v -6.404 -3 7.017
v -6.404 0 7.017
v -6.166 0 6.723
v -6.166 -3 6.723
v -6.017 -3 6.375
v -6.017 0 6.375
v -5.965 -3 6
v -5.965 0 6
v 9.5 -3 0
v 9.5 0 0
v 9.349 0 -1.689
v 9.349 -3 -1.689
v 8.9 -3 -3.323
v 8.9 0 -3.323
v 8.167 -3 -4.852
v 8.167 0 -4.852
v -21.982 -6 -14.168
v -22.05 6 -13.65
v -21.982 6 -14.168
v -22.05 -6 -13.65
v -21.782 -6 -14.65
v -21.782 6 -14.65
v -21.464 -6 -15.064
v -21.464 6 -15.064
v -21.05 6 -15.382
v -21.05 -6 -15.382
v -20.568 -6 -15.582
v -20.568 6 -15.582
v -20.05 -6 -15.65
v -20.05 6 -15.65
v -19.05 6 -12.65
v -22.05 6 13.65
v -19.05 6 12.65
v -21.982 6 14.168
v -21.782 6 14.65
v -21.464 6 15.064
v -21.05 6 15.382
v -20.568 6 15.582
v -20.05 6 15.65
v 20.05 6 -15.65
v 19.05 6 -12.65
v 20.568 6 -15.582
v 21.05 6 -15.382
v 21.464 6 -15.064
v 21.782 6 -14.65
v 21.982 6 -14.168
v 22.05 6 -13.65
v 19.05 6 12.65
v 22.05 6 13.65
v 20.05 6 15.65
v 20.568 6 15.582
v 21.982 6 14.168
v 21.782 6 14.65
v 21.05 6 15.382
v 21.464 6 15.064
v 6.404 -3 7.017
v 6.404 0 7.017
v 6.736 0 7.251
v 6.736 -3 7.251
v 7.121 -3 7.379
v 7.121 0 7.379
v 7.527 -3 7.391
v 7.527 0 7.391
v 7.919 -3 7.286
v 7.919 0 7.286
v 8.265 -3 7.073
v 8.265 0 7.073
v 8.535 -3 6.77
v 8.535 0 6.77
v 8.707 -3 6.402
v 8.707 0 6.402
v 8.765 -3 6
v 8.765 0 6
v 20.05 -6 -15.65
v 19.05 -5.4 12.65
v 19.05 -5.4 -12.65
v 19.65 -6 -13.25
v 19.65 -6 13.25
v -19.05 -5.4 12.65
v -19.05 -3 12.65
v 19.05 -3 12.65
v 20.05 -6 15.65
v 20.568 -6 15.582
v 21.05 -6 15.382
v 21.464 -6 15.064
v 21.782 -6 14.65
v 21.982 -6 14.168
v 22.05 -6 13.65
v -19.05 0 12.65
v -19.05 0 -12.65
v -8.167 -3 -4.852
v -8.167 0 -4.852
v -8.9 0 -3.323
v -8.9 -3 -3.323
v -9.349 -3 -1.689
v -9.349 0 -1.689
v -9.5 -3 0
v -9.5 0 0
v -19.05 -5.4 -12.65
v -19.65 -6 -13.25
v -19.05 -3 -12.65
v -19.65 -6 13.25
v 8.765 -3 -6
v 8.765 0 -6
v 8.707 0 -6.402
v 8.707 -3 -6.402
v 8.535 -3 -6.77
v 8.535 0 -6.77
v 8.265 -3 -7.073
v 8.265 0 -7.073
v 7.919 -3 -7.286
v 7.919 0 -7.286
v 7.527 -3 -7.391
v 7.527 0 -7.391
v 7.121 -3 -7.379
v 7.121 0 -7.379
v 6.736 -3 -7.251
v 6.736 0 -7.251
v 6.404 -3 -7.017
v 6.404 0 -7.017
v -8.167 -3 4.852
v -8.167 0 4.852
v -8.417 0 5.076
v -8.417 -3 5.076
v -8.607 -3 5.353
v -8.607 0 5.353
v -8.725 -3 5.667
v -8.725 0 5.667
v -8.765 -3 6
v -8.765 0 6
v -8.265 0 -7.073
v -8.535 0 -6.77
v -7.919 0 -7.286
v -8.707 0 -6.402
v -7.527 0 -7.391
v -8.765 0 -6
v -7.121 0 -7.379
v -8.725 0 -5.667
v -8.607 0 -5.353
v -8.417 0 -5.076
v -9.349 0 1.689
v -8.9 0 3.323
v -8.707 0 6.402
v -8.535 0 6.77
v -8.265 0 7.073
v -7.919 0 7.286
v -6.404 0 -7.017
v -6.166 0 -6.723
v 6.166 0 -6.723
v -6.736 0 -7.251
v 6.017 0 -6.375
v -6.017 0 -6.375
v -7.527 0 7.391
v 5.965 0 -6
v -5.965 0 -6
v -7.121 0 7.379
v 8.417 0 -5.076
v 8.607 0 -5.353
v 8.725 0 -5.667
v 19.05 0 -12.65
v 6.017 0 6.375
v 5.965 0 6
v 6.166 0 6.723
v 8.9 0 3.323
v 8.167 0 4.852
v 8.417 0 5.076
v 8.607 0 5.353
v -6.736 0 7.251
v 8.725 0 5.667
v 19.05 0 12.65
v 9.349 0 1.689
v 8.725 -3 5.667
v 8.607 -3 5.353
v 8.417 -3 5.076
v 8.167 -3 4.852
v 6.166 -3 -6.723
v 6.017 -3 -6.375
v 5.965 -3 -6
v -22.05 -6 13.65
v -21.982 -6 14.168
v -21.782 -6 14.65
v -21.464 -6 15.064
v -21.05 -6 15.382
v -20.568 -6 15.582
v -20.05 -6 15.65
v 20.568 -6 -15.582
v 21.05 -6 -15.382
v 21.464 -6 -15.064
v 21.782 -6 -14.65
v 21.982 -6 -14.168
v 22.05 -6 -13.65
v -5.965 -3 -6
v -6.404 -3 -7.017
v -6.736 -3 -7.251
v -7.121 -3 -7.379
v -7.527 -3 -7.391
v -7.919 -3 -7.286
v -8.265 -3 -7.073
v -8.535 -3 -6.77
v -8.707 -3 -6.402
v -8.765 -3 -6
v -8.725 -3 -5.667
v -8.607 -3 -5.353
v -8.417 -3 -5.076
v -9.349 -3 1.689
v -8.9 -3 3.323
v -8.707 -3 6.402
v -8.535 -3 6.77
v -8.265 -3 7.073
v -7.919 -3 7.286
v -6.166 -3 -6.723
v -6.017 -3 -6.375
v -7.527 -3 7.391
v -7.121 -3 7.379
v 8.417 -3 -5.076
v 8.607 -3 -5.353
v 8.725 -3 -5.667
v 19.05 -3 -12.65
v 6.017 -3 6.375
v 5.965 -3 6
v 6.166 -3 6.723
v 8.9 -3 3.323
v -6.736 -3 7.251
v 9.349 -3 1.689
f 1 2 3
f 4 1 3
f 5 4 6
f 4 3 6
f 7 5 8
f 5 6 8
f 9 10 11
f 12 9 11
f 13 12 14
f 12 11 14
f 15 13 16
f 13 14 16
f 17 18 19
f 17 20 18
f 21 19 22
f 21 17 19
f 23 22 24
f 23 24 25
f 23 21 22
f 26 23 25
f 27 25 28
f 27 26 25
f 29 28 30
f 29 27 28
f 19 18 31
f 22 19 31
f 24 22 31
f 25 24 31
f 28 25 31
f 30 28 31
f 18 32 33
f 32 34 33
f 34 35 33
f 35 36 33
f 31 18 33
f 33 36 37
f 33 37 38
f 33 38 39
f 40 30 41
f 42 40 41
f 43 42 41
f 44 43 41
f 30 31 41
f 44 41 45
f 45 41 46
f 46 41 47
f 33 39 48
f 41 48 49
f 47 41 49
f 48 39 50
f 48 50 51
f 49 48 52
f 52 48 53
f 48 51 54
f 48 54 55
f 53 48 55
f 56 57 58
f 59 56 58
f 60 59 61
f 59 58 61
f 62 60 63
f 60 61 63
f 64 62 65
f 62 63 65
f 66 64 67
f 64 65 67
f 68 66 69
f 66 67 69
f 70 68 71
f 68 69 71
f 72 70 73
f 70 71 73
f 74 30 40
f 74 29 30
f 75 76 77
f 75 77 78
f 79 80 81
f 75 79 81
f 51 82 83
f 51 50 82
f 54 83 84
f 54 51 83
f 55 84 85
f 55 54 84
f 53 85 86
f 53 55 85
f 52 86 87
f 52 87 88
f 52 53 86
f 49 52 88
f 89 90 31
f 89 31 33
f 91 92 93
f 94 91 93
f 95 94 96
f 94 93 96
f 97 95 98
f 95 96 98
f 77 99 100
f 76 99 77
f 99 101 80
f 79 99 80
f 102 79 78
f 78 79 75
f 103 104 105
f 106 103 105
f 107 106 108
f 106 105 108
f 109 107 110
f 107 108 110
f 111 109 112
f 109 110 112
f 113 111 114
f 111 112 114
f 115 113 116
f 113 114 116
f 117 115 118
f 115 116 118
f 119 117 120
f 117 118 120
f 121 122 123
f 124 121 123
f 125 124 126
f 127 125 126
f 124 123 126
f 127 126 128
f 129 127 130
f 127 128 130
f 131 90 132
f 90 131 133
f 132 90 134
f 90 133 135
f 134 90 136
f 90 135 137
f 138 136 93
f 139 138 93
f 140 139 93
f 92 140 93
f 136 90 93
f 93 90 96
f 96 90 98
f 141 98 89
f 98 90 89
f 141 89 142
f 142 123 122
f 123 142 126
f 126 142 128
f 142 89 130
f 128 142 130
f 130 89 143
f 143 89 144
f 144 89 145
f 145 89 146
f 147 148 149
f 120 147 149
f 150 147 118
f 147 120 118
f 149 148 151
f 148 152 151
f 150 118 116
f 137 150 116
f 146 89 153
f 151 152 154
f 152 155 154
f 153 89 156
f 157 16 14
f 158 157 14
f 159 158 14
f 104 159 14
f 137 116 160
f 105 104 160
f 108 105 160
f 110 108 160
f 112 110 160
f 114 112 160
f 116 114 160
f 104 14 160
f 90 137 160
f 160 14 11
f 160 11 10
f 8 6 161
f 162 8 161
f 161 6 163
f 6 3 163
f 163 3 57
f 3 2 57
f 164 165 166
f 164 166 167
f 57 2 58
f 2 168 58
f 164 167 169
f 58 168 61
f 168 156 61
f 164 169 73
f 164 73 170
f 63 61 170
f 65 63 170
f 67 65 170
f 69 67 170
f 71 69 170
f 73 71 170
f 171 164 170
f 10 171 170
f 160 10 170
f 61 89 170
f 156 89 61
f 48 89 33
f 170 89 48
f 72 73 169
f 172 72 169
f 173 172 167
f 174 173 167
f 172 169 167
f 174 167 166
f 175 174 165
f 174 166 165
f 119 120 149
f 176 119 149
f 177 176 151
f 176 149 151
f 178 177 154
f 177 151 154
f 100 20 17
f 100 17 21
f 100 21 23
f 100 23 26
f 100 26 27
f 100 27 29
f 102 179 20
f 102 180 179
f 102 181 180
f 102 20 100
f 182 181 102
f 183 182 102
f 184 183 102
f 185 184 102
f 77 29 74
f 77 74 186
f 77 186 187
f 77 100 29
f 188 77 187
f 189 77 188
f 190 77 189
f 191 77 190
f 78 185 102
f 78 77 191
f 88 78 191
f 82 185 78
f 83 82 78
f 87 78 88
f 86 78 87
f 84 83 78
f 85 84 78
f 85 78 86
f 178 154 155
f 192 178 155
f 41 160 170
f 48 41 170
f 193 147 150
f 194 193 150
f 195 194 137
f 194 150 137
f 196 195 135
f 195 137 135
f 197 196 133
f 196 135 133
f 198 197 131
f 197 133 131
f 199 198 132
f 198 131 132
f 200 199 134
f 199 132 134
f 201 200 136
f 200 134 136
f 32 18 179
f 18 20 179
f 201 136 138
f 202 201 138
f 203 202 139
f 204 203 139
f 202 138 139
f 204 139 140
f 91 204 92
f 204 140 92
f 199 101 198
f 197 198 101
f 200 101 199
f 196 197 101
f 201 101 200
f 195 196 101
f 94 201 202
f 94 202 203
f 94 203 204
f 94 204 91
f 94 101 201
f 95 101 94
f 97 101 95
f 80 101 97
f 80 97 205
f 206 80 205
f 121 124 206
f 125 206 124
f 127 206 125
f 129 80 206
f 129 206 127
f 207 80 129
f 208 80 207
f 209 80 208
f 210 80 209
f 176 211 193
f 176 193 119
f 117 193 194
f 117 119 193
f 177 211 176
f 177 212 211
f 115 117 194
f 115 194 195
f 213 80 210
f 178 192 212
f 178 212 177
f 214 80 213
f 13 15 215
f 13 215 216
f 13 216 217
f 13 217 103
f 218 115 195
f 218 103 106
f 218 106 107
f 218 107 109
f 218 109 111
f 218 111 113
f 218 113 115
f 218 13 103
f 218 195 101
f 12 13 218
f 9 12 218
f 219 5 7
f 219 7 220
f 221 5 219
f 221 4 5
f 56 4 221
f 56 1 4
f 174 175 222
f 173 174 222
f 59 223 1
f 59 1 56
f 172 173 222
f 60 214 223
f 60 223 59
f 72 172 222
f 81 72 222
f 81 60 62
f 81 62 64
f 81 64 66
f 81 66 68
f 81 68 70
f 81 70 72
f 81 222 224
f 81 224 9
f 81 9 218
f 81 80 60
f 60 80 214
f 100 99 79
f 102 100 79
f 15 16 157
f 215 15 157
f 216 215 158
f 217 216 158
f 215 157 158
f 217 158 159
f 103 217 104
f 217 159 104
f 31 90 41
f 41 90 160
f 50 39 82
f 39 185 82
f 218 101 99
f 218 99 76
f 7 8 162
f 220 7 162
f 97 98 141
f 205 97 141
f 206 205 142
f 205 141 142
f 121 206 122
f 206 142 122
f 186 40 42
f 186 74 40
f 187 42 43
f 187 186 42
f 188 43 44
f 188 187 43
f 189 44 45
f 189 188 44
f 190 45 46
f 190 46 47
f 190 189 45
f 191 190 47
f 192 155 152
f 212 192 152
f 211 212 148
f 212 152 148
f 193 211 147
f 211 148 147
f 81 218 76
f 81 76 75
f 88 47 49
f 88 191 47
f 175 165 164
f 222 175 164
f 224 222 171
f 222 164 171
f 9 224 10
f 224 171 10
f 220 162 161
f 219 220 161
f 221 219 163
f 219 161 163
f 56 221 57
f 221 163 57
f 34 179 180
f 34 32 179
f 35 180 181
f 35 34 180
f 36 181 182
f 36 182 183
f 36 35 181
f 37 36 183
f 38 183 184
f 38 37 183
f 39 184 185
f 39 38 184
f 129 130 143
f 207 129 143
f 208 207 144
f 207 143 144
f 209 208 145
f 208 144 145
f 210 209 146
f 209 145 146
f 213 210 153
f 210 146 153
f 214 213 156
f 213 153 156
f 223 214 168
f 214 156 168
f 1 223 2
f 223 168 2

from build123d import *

# Parameters (mm, degrees)
F0_W     = 38.1
F0_H     = 25.3
F1_DEPTH = 3
F0_W_2   = 44.1
F0_H_2   = 31.3
F2_DEPTH = 6
F3_DEPTH = 6
F4_SIZE  = 0.6
F5_R     = 2


# Not quite as in the source:
# - a feature names something its author has since deleted; it is built from what else it names


with BuildPart() as f1:
    # F0 (on Front) → F1 (new body)
    with BuildSketch(Plane.XZ):
        Rectangle(F0_W, F0_H)
        with BuildLine():
            ThreePointArc((-8.6746757864, 9), (0, 12.5), (8.6746757864, 9))
            Line((8.6746757864, 9), (12.5, 9))
            Line((12.5, 9), (12.5, 0))
            Line((12.5, 0), (12.5, -9))
            Line((12.5, -9), (8.6746757864, -9))
            ThreePointArc((8.6746757864, -9), (0, -12.5), (-8.6746757864, -9))
            Line((-8.6746757864, -9), (-12.5, -9))
            Line((-12.5, -9), (-12.5, 0))
            Line((-12.5, 0), (-12.5, 9))
            Line((-12.5, 9), (-8.6746757864, 9))
        make_face(mode=Mode.SUBTRACT)
        with BuildLine():
            ThreePointArc((-3.0413812651, 9), (0, 9.5), (3.0413812651, 9))
            Line((3.0413812651, 9), (8.6746757864, 9))
            ThreePointArc((8.6746757864, 9), (0, 12.5), (-8.6746757864, 9))
            Line((-8.6746757864, 9), (-3.0413812651, 9))
        make_face()
        with BuildLine():
            ThreePointArc((12.5, 0), (11.5039872942, -4.8896090165), (8.6746757864, -9))
            Line((8.6746757864, -9), (12.5, -9))
            Line((12.5, -9), (12.5, 0))
        make_face()
        with BuildLine():
            Line((8.6746757864, -9), (3.0413812651, -9))
            ThreePointArc((3.0413812651, -9), (0, -9.5), (-3.0413812651, -9))
            Line((-3.0413812651, -9), (-8.6746757864, -9))
            ThreePointArc((-8.6746757864, -9), (0, -12.5), (8.6746757864, -9))
        make_face()
        with BuildLine():
            Line((-12.5, -9), (-8.6746757864, -9))
            ThreePointArc((-8.6746757864, -9), (-11.5039872942, -4.8896090165), (-12.5, 0))
            Line((-12.5, 0), (-12.5, -9))
        make_face()
        with BuildLine():
            Line((-3.0413812651, 9), (3.0413812651, 9))
            ThreePointArc((3.0413812651, 9), (0, 9.5), (-3.0413812651, 9))
        make_face()
        with BuildLine():
            ThreePointArc((-3.0413812651, -9), (0, -9.5), (3.0413812651, -9))
            Line((3.0413812651, -9), (-3.0413812651, -9))
        make_face()
        with BuildLine():
            ThreePointArc((-6.4036735124, 7.0173332219), (-4.8254540539, 8.1832141102), (-3.0413812651, 9))
            Line((-3.0413812651, 9), (-8.6746757864, 9))
            ThreePointArc((-8.6746757864, 9), (-11.5039872942, 4.8896090165), (-12.5, 0))
            ThreePointArc((-12.5, 0), (-11.5039872942, -4.8896090165), (-8.6746757864, -9))
            Line((-8.6746757864, -9), (-3.0413812651, -9))
            ThreePointArc((-3.0413812651, -9), (-4.8254540539, -8.1832141102), (-6.4036735124, -7.0173332219))
            ThreePointArc((-6.4036735124, -7.0173332219), (-7.9193096463, -7.2857878881), (-8.7654599313, -6))
            Line((-8.7654599313, -6), (-9.5, -6))
            Line((-9.5, -6), (-9.5, 0))
            Line((-9.5, 0), (-9.5, 6))
            Line((-9.5, 6), (-8.7654599313, 6))
            ThreePointArc((-8.7654599313, 6), (-7.9193096463, 7.2857878881), (-6.4036735124, 7.0173332219))
        make_face()
        with BuildLine():
            Line((9.5, 6), (9.5, 0))
            Line((9.5, 0), (9.5, -6))
            Line((9.5, -6), (8.7654599313, -6))
            ThreePointArc((8.7654599313, -6), (7.9193096463, -7.2857878881), (6.4036735124, -7.0173332219))
            ThreePointArc((6.4036735124, -7.0173332219), (4.8254540539, -8.1832141102), (3.0413812651, -9))
            Line((3.0413812651, -9), (8.6746757864, -9))
            ThreePointArc((8.6746757864, -9), (11.5039872942, -4.8896090165), (12.5, 0))
            ThreePointArc((12.5, 0), (11.5039872942, 4.8896090165), (8.6746757864, 9))
            Line((8.6746757864, 9), (3.0413812651, 9))
            ThreePointArc((3.0413812651, 9), (4.8254540539, 8.1832141102), (6.4036735124, 7.0173332219))
            ThreePointArc((6.4036735124, 7.0173332219), (7.9193096463, 7.2857878881), (8.7654599313, 6))
            Line((8.7654599313, 6), (9.5, 6))
        make_face()
        with BuildLine():
            Line((9.5, -6), (9.5, 0))
            ThreePointArc((9.5, 0), (9.1607649693, -2.5160256709), (8.1672873313, -4.852362069))
            ThreePointArc((8.1672873313, -4.852362069), (8.6069425852, -5.3529135915), (8.7654599313, -6))
            Line((8.7654599313, -6), (9.5, -6))
        make_face()
        with BuildLine():
            ThreePointArc((-8.7654599313, -6), (-8.6069425852, -5.3529135915), (-8.1672873313, -4.852362069))
            ThreePointArc((-8.1672873313, -4.852362069), (-9.1607649693, -2.5160256709), (-9.5, 0))
            Line((-9.5, 0), (-9.5, -6))
            Line((-9.5, -6), (-8.7654599313, -6))
        make_face()
        with BuildLine():
            ThreePointArc((-9.5, 0), (-9.1607649693, 2.5160256709), (-8.1672873313, 4.852362069))
            ThreePointArc((-8.1672873313, 4.852362069), (-8.6069425852, 5.3529135915), (-8.7654599313, 6))
            Line((-8.7654599313, 6), (-9.5, 6))
            Line((-9.5, 6), (-9.5, 0))
        make_face()
        with BuildLine():
            ThreePointArc((8.1672873313, 4.852362069), (9.1607649693, 2.5160256709), (9.5, 0))
            Line((9.5, 0), (9.5, 6))
            Line((9.5, 6), (8.7654599313, 6))
            ThreePointArc((8.7654599313, 6), (8.6069425852, 5.3529135915), (8.1672873313, 4.852362069))
        make_face()
        with BuildLine():
            ThreePointArc((-12.5, 0), (-11.5039872942, 4.8896090165), (-8.6746757864, 9))
            Line((-8.6746757864, 9), (-12.5, 9))
            Line((-12.5, 9), (-12.5, 0))
        make_face()
        with BuildLine():
            Line((12.5, 9), (8.6746757864, 9))
            ThreePointArc((8.6746757864, 9), (11.5039872942, 4.8896090165), (12.5, 0))
            Line((12.5, 0), (12.5, 9))
        make_face()
        with BuildLine():
            ThreePointArc((5.9654599313, 6), (6.0796720432, 6.5538497149), (6.4036735124, 7.0173332219))
            ThreePointArc((6.4036735124, 7.0173332219), (4.8254540539, 8.1832141102), (3.0413812651, 9))
            Line((3.0413812651, 9), (-3.0413812651, 9))
            ThreePointArc((-3.0413812651, 9), (-4.8254540539, 8.1832141102), (-6.4036735124, 7.0173332219))
            ThreePointArc((-6.4036735124, 7.0173332219), (-6.0796720432, 6.5538497149), (-5.9654599313, 6))
            Line((-5.9654599313, 6), (5.9654599313, 6))
        make_face()
        with BuildLine():
            ThreePointArc((3.0413812651, -9), (4.8254540539, -8.1832141102), (6.4036735124, -7.0173332219))
            ThreePointArc((6.4036735124, -7.0173332219), (6.0796720432, -6.5538497149), (5.9654599313, -6))
            Line((5.9654599313, -6), (-5.9654599313, -6))
            ThreePointArc((-5.9654599313, -6), (-6.0796720432, -6.5538497149), (-6.4036735124, -7.0173332219))
            ThreePointArc((-6.4036735124, -7.0173332219), (-4.8254540539, -8.1832141102), (-3.0413812651, -9))
            Line((-3.0413812651, -9), (3.0413812651, -9))
        make_face()
    extrude(amount=F1_DEPTH)

    # F0 (on Front) → F2 (join)
    with BuildSketch(Plane.XZ):
        Rectangle(F0_W_2, F0_H_2)
        Rectangle(F0_W, F0_H, mode=Mode.SUBTRACT)
    extrude(amount=F2_DEPTH)

    # F0 (on Front) → F3 (join)
    with BuildSketch(Plane.XZ):
        Rectangle(F0_W_2, F0_H_2)
        Rectangle(F0_W, F0_H, mode=Mode.SUBTRACT)
    extrude(amount=-F3_DEPTH)

    # F4
    f4_edges = [f1.edges().sort_by_distance(p)[0] for p in [
        (-19.05, -6, 0),
        (0, -6, -12.65),
        (0, -6, 12.65),
        (19.05, -6, 0),
    ]]
    chamfer(f4_edges, length=F4_SIZE)

    # F5
    f5_edges = [f1.edges().sort_by_distance(p)[0] for p in [
        (22.05, 0, 15.65),
        (22.05, 0, -15.65),
        (-22.05, 0, -15.65),
        (-22.05, 0, 15.65),
    ]]
    fillet(f5_edges, radius=F5_R)


solid = f1.part
